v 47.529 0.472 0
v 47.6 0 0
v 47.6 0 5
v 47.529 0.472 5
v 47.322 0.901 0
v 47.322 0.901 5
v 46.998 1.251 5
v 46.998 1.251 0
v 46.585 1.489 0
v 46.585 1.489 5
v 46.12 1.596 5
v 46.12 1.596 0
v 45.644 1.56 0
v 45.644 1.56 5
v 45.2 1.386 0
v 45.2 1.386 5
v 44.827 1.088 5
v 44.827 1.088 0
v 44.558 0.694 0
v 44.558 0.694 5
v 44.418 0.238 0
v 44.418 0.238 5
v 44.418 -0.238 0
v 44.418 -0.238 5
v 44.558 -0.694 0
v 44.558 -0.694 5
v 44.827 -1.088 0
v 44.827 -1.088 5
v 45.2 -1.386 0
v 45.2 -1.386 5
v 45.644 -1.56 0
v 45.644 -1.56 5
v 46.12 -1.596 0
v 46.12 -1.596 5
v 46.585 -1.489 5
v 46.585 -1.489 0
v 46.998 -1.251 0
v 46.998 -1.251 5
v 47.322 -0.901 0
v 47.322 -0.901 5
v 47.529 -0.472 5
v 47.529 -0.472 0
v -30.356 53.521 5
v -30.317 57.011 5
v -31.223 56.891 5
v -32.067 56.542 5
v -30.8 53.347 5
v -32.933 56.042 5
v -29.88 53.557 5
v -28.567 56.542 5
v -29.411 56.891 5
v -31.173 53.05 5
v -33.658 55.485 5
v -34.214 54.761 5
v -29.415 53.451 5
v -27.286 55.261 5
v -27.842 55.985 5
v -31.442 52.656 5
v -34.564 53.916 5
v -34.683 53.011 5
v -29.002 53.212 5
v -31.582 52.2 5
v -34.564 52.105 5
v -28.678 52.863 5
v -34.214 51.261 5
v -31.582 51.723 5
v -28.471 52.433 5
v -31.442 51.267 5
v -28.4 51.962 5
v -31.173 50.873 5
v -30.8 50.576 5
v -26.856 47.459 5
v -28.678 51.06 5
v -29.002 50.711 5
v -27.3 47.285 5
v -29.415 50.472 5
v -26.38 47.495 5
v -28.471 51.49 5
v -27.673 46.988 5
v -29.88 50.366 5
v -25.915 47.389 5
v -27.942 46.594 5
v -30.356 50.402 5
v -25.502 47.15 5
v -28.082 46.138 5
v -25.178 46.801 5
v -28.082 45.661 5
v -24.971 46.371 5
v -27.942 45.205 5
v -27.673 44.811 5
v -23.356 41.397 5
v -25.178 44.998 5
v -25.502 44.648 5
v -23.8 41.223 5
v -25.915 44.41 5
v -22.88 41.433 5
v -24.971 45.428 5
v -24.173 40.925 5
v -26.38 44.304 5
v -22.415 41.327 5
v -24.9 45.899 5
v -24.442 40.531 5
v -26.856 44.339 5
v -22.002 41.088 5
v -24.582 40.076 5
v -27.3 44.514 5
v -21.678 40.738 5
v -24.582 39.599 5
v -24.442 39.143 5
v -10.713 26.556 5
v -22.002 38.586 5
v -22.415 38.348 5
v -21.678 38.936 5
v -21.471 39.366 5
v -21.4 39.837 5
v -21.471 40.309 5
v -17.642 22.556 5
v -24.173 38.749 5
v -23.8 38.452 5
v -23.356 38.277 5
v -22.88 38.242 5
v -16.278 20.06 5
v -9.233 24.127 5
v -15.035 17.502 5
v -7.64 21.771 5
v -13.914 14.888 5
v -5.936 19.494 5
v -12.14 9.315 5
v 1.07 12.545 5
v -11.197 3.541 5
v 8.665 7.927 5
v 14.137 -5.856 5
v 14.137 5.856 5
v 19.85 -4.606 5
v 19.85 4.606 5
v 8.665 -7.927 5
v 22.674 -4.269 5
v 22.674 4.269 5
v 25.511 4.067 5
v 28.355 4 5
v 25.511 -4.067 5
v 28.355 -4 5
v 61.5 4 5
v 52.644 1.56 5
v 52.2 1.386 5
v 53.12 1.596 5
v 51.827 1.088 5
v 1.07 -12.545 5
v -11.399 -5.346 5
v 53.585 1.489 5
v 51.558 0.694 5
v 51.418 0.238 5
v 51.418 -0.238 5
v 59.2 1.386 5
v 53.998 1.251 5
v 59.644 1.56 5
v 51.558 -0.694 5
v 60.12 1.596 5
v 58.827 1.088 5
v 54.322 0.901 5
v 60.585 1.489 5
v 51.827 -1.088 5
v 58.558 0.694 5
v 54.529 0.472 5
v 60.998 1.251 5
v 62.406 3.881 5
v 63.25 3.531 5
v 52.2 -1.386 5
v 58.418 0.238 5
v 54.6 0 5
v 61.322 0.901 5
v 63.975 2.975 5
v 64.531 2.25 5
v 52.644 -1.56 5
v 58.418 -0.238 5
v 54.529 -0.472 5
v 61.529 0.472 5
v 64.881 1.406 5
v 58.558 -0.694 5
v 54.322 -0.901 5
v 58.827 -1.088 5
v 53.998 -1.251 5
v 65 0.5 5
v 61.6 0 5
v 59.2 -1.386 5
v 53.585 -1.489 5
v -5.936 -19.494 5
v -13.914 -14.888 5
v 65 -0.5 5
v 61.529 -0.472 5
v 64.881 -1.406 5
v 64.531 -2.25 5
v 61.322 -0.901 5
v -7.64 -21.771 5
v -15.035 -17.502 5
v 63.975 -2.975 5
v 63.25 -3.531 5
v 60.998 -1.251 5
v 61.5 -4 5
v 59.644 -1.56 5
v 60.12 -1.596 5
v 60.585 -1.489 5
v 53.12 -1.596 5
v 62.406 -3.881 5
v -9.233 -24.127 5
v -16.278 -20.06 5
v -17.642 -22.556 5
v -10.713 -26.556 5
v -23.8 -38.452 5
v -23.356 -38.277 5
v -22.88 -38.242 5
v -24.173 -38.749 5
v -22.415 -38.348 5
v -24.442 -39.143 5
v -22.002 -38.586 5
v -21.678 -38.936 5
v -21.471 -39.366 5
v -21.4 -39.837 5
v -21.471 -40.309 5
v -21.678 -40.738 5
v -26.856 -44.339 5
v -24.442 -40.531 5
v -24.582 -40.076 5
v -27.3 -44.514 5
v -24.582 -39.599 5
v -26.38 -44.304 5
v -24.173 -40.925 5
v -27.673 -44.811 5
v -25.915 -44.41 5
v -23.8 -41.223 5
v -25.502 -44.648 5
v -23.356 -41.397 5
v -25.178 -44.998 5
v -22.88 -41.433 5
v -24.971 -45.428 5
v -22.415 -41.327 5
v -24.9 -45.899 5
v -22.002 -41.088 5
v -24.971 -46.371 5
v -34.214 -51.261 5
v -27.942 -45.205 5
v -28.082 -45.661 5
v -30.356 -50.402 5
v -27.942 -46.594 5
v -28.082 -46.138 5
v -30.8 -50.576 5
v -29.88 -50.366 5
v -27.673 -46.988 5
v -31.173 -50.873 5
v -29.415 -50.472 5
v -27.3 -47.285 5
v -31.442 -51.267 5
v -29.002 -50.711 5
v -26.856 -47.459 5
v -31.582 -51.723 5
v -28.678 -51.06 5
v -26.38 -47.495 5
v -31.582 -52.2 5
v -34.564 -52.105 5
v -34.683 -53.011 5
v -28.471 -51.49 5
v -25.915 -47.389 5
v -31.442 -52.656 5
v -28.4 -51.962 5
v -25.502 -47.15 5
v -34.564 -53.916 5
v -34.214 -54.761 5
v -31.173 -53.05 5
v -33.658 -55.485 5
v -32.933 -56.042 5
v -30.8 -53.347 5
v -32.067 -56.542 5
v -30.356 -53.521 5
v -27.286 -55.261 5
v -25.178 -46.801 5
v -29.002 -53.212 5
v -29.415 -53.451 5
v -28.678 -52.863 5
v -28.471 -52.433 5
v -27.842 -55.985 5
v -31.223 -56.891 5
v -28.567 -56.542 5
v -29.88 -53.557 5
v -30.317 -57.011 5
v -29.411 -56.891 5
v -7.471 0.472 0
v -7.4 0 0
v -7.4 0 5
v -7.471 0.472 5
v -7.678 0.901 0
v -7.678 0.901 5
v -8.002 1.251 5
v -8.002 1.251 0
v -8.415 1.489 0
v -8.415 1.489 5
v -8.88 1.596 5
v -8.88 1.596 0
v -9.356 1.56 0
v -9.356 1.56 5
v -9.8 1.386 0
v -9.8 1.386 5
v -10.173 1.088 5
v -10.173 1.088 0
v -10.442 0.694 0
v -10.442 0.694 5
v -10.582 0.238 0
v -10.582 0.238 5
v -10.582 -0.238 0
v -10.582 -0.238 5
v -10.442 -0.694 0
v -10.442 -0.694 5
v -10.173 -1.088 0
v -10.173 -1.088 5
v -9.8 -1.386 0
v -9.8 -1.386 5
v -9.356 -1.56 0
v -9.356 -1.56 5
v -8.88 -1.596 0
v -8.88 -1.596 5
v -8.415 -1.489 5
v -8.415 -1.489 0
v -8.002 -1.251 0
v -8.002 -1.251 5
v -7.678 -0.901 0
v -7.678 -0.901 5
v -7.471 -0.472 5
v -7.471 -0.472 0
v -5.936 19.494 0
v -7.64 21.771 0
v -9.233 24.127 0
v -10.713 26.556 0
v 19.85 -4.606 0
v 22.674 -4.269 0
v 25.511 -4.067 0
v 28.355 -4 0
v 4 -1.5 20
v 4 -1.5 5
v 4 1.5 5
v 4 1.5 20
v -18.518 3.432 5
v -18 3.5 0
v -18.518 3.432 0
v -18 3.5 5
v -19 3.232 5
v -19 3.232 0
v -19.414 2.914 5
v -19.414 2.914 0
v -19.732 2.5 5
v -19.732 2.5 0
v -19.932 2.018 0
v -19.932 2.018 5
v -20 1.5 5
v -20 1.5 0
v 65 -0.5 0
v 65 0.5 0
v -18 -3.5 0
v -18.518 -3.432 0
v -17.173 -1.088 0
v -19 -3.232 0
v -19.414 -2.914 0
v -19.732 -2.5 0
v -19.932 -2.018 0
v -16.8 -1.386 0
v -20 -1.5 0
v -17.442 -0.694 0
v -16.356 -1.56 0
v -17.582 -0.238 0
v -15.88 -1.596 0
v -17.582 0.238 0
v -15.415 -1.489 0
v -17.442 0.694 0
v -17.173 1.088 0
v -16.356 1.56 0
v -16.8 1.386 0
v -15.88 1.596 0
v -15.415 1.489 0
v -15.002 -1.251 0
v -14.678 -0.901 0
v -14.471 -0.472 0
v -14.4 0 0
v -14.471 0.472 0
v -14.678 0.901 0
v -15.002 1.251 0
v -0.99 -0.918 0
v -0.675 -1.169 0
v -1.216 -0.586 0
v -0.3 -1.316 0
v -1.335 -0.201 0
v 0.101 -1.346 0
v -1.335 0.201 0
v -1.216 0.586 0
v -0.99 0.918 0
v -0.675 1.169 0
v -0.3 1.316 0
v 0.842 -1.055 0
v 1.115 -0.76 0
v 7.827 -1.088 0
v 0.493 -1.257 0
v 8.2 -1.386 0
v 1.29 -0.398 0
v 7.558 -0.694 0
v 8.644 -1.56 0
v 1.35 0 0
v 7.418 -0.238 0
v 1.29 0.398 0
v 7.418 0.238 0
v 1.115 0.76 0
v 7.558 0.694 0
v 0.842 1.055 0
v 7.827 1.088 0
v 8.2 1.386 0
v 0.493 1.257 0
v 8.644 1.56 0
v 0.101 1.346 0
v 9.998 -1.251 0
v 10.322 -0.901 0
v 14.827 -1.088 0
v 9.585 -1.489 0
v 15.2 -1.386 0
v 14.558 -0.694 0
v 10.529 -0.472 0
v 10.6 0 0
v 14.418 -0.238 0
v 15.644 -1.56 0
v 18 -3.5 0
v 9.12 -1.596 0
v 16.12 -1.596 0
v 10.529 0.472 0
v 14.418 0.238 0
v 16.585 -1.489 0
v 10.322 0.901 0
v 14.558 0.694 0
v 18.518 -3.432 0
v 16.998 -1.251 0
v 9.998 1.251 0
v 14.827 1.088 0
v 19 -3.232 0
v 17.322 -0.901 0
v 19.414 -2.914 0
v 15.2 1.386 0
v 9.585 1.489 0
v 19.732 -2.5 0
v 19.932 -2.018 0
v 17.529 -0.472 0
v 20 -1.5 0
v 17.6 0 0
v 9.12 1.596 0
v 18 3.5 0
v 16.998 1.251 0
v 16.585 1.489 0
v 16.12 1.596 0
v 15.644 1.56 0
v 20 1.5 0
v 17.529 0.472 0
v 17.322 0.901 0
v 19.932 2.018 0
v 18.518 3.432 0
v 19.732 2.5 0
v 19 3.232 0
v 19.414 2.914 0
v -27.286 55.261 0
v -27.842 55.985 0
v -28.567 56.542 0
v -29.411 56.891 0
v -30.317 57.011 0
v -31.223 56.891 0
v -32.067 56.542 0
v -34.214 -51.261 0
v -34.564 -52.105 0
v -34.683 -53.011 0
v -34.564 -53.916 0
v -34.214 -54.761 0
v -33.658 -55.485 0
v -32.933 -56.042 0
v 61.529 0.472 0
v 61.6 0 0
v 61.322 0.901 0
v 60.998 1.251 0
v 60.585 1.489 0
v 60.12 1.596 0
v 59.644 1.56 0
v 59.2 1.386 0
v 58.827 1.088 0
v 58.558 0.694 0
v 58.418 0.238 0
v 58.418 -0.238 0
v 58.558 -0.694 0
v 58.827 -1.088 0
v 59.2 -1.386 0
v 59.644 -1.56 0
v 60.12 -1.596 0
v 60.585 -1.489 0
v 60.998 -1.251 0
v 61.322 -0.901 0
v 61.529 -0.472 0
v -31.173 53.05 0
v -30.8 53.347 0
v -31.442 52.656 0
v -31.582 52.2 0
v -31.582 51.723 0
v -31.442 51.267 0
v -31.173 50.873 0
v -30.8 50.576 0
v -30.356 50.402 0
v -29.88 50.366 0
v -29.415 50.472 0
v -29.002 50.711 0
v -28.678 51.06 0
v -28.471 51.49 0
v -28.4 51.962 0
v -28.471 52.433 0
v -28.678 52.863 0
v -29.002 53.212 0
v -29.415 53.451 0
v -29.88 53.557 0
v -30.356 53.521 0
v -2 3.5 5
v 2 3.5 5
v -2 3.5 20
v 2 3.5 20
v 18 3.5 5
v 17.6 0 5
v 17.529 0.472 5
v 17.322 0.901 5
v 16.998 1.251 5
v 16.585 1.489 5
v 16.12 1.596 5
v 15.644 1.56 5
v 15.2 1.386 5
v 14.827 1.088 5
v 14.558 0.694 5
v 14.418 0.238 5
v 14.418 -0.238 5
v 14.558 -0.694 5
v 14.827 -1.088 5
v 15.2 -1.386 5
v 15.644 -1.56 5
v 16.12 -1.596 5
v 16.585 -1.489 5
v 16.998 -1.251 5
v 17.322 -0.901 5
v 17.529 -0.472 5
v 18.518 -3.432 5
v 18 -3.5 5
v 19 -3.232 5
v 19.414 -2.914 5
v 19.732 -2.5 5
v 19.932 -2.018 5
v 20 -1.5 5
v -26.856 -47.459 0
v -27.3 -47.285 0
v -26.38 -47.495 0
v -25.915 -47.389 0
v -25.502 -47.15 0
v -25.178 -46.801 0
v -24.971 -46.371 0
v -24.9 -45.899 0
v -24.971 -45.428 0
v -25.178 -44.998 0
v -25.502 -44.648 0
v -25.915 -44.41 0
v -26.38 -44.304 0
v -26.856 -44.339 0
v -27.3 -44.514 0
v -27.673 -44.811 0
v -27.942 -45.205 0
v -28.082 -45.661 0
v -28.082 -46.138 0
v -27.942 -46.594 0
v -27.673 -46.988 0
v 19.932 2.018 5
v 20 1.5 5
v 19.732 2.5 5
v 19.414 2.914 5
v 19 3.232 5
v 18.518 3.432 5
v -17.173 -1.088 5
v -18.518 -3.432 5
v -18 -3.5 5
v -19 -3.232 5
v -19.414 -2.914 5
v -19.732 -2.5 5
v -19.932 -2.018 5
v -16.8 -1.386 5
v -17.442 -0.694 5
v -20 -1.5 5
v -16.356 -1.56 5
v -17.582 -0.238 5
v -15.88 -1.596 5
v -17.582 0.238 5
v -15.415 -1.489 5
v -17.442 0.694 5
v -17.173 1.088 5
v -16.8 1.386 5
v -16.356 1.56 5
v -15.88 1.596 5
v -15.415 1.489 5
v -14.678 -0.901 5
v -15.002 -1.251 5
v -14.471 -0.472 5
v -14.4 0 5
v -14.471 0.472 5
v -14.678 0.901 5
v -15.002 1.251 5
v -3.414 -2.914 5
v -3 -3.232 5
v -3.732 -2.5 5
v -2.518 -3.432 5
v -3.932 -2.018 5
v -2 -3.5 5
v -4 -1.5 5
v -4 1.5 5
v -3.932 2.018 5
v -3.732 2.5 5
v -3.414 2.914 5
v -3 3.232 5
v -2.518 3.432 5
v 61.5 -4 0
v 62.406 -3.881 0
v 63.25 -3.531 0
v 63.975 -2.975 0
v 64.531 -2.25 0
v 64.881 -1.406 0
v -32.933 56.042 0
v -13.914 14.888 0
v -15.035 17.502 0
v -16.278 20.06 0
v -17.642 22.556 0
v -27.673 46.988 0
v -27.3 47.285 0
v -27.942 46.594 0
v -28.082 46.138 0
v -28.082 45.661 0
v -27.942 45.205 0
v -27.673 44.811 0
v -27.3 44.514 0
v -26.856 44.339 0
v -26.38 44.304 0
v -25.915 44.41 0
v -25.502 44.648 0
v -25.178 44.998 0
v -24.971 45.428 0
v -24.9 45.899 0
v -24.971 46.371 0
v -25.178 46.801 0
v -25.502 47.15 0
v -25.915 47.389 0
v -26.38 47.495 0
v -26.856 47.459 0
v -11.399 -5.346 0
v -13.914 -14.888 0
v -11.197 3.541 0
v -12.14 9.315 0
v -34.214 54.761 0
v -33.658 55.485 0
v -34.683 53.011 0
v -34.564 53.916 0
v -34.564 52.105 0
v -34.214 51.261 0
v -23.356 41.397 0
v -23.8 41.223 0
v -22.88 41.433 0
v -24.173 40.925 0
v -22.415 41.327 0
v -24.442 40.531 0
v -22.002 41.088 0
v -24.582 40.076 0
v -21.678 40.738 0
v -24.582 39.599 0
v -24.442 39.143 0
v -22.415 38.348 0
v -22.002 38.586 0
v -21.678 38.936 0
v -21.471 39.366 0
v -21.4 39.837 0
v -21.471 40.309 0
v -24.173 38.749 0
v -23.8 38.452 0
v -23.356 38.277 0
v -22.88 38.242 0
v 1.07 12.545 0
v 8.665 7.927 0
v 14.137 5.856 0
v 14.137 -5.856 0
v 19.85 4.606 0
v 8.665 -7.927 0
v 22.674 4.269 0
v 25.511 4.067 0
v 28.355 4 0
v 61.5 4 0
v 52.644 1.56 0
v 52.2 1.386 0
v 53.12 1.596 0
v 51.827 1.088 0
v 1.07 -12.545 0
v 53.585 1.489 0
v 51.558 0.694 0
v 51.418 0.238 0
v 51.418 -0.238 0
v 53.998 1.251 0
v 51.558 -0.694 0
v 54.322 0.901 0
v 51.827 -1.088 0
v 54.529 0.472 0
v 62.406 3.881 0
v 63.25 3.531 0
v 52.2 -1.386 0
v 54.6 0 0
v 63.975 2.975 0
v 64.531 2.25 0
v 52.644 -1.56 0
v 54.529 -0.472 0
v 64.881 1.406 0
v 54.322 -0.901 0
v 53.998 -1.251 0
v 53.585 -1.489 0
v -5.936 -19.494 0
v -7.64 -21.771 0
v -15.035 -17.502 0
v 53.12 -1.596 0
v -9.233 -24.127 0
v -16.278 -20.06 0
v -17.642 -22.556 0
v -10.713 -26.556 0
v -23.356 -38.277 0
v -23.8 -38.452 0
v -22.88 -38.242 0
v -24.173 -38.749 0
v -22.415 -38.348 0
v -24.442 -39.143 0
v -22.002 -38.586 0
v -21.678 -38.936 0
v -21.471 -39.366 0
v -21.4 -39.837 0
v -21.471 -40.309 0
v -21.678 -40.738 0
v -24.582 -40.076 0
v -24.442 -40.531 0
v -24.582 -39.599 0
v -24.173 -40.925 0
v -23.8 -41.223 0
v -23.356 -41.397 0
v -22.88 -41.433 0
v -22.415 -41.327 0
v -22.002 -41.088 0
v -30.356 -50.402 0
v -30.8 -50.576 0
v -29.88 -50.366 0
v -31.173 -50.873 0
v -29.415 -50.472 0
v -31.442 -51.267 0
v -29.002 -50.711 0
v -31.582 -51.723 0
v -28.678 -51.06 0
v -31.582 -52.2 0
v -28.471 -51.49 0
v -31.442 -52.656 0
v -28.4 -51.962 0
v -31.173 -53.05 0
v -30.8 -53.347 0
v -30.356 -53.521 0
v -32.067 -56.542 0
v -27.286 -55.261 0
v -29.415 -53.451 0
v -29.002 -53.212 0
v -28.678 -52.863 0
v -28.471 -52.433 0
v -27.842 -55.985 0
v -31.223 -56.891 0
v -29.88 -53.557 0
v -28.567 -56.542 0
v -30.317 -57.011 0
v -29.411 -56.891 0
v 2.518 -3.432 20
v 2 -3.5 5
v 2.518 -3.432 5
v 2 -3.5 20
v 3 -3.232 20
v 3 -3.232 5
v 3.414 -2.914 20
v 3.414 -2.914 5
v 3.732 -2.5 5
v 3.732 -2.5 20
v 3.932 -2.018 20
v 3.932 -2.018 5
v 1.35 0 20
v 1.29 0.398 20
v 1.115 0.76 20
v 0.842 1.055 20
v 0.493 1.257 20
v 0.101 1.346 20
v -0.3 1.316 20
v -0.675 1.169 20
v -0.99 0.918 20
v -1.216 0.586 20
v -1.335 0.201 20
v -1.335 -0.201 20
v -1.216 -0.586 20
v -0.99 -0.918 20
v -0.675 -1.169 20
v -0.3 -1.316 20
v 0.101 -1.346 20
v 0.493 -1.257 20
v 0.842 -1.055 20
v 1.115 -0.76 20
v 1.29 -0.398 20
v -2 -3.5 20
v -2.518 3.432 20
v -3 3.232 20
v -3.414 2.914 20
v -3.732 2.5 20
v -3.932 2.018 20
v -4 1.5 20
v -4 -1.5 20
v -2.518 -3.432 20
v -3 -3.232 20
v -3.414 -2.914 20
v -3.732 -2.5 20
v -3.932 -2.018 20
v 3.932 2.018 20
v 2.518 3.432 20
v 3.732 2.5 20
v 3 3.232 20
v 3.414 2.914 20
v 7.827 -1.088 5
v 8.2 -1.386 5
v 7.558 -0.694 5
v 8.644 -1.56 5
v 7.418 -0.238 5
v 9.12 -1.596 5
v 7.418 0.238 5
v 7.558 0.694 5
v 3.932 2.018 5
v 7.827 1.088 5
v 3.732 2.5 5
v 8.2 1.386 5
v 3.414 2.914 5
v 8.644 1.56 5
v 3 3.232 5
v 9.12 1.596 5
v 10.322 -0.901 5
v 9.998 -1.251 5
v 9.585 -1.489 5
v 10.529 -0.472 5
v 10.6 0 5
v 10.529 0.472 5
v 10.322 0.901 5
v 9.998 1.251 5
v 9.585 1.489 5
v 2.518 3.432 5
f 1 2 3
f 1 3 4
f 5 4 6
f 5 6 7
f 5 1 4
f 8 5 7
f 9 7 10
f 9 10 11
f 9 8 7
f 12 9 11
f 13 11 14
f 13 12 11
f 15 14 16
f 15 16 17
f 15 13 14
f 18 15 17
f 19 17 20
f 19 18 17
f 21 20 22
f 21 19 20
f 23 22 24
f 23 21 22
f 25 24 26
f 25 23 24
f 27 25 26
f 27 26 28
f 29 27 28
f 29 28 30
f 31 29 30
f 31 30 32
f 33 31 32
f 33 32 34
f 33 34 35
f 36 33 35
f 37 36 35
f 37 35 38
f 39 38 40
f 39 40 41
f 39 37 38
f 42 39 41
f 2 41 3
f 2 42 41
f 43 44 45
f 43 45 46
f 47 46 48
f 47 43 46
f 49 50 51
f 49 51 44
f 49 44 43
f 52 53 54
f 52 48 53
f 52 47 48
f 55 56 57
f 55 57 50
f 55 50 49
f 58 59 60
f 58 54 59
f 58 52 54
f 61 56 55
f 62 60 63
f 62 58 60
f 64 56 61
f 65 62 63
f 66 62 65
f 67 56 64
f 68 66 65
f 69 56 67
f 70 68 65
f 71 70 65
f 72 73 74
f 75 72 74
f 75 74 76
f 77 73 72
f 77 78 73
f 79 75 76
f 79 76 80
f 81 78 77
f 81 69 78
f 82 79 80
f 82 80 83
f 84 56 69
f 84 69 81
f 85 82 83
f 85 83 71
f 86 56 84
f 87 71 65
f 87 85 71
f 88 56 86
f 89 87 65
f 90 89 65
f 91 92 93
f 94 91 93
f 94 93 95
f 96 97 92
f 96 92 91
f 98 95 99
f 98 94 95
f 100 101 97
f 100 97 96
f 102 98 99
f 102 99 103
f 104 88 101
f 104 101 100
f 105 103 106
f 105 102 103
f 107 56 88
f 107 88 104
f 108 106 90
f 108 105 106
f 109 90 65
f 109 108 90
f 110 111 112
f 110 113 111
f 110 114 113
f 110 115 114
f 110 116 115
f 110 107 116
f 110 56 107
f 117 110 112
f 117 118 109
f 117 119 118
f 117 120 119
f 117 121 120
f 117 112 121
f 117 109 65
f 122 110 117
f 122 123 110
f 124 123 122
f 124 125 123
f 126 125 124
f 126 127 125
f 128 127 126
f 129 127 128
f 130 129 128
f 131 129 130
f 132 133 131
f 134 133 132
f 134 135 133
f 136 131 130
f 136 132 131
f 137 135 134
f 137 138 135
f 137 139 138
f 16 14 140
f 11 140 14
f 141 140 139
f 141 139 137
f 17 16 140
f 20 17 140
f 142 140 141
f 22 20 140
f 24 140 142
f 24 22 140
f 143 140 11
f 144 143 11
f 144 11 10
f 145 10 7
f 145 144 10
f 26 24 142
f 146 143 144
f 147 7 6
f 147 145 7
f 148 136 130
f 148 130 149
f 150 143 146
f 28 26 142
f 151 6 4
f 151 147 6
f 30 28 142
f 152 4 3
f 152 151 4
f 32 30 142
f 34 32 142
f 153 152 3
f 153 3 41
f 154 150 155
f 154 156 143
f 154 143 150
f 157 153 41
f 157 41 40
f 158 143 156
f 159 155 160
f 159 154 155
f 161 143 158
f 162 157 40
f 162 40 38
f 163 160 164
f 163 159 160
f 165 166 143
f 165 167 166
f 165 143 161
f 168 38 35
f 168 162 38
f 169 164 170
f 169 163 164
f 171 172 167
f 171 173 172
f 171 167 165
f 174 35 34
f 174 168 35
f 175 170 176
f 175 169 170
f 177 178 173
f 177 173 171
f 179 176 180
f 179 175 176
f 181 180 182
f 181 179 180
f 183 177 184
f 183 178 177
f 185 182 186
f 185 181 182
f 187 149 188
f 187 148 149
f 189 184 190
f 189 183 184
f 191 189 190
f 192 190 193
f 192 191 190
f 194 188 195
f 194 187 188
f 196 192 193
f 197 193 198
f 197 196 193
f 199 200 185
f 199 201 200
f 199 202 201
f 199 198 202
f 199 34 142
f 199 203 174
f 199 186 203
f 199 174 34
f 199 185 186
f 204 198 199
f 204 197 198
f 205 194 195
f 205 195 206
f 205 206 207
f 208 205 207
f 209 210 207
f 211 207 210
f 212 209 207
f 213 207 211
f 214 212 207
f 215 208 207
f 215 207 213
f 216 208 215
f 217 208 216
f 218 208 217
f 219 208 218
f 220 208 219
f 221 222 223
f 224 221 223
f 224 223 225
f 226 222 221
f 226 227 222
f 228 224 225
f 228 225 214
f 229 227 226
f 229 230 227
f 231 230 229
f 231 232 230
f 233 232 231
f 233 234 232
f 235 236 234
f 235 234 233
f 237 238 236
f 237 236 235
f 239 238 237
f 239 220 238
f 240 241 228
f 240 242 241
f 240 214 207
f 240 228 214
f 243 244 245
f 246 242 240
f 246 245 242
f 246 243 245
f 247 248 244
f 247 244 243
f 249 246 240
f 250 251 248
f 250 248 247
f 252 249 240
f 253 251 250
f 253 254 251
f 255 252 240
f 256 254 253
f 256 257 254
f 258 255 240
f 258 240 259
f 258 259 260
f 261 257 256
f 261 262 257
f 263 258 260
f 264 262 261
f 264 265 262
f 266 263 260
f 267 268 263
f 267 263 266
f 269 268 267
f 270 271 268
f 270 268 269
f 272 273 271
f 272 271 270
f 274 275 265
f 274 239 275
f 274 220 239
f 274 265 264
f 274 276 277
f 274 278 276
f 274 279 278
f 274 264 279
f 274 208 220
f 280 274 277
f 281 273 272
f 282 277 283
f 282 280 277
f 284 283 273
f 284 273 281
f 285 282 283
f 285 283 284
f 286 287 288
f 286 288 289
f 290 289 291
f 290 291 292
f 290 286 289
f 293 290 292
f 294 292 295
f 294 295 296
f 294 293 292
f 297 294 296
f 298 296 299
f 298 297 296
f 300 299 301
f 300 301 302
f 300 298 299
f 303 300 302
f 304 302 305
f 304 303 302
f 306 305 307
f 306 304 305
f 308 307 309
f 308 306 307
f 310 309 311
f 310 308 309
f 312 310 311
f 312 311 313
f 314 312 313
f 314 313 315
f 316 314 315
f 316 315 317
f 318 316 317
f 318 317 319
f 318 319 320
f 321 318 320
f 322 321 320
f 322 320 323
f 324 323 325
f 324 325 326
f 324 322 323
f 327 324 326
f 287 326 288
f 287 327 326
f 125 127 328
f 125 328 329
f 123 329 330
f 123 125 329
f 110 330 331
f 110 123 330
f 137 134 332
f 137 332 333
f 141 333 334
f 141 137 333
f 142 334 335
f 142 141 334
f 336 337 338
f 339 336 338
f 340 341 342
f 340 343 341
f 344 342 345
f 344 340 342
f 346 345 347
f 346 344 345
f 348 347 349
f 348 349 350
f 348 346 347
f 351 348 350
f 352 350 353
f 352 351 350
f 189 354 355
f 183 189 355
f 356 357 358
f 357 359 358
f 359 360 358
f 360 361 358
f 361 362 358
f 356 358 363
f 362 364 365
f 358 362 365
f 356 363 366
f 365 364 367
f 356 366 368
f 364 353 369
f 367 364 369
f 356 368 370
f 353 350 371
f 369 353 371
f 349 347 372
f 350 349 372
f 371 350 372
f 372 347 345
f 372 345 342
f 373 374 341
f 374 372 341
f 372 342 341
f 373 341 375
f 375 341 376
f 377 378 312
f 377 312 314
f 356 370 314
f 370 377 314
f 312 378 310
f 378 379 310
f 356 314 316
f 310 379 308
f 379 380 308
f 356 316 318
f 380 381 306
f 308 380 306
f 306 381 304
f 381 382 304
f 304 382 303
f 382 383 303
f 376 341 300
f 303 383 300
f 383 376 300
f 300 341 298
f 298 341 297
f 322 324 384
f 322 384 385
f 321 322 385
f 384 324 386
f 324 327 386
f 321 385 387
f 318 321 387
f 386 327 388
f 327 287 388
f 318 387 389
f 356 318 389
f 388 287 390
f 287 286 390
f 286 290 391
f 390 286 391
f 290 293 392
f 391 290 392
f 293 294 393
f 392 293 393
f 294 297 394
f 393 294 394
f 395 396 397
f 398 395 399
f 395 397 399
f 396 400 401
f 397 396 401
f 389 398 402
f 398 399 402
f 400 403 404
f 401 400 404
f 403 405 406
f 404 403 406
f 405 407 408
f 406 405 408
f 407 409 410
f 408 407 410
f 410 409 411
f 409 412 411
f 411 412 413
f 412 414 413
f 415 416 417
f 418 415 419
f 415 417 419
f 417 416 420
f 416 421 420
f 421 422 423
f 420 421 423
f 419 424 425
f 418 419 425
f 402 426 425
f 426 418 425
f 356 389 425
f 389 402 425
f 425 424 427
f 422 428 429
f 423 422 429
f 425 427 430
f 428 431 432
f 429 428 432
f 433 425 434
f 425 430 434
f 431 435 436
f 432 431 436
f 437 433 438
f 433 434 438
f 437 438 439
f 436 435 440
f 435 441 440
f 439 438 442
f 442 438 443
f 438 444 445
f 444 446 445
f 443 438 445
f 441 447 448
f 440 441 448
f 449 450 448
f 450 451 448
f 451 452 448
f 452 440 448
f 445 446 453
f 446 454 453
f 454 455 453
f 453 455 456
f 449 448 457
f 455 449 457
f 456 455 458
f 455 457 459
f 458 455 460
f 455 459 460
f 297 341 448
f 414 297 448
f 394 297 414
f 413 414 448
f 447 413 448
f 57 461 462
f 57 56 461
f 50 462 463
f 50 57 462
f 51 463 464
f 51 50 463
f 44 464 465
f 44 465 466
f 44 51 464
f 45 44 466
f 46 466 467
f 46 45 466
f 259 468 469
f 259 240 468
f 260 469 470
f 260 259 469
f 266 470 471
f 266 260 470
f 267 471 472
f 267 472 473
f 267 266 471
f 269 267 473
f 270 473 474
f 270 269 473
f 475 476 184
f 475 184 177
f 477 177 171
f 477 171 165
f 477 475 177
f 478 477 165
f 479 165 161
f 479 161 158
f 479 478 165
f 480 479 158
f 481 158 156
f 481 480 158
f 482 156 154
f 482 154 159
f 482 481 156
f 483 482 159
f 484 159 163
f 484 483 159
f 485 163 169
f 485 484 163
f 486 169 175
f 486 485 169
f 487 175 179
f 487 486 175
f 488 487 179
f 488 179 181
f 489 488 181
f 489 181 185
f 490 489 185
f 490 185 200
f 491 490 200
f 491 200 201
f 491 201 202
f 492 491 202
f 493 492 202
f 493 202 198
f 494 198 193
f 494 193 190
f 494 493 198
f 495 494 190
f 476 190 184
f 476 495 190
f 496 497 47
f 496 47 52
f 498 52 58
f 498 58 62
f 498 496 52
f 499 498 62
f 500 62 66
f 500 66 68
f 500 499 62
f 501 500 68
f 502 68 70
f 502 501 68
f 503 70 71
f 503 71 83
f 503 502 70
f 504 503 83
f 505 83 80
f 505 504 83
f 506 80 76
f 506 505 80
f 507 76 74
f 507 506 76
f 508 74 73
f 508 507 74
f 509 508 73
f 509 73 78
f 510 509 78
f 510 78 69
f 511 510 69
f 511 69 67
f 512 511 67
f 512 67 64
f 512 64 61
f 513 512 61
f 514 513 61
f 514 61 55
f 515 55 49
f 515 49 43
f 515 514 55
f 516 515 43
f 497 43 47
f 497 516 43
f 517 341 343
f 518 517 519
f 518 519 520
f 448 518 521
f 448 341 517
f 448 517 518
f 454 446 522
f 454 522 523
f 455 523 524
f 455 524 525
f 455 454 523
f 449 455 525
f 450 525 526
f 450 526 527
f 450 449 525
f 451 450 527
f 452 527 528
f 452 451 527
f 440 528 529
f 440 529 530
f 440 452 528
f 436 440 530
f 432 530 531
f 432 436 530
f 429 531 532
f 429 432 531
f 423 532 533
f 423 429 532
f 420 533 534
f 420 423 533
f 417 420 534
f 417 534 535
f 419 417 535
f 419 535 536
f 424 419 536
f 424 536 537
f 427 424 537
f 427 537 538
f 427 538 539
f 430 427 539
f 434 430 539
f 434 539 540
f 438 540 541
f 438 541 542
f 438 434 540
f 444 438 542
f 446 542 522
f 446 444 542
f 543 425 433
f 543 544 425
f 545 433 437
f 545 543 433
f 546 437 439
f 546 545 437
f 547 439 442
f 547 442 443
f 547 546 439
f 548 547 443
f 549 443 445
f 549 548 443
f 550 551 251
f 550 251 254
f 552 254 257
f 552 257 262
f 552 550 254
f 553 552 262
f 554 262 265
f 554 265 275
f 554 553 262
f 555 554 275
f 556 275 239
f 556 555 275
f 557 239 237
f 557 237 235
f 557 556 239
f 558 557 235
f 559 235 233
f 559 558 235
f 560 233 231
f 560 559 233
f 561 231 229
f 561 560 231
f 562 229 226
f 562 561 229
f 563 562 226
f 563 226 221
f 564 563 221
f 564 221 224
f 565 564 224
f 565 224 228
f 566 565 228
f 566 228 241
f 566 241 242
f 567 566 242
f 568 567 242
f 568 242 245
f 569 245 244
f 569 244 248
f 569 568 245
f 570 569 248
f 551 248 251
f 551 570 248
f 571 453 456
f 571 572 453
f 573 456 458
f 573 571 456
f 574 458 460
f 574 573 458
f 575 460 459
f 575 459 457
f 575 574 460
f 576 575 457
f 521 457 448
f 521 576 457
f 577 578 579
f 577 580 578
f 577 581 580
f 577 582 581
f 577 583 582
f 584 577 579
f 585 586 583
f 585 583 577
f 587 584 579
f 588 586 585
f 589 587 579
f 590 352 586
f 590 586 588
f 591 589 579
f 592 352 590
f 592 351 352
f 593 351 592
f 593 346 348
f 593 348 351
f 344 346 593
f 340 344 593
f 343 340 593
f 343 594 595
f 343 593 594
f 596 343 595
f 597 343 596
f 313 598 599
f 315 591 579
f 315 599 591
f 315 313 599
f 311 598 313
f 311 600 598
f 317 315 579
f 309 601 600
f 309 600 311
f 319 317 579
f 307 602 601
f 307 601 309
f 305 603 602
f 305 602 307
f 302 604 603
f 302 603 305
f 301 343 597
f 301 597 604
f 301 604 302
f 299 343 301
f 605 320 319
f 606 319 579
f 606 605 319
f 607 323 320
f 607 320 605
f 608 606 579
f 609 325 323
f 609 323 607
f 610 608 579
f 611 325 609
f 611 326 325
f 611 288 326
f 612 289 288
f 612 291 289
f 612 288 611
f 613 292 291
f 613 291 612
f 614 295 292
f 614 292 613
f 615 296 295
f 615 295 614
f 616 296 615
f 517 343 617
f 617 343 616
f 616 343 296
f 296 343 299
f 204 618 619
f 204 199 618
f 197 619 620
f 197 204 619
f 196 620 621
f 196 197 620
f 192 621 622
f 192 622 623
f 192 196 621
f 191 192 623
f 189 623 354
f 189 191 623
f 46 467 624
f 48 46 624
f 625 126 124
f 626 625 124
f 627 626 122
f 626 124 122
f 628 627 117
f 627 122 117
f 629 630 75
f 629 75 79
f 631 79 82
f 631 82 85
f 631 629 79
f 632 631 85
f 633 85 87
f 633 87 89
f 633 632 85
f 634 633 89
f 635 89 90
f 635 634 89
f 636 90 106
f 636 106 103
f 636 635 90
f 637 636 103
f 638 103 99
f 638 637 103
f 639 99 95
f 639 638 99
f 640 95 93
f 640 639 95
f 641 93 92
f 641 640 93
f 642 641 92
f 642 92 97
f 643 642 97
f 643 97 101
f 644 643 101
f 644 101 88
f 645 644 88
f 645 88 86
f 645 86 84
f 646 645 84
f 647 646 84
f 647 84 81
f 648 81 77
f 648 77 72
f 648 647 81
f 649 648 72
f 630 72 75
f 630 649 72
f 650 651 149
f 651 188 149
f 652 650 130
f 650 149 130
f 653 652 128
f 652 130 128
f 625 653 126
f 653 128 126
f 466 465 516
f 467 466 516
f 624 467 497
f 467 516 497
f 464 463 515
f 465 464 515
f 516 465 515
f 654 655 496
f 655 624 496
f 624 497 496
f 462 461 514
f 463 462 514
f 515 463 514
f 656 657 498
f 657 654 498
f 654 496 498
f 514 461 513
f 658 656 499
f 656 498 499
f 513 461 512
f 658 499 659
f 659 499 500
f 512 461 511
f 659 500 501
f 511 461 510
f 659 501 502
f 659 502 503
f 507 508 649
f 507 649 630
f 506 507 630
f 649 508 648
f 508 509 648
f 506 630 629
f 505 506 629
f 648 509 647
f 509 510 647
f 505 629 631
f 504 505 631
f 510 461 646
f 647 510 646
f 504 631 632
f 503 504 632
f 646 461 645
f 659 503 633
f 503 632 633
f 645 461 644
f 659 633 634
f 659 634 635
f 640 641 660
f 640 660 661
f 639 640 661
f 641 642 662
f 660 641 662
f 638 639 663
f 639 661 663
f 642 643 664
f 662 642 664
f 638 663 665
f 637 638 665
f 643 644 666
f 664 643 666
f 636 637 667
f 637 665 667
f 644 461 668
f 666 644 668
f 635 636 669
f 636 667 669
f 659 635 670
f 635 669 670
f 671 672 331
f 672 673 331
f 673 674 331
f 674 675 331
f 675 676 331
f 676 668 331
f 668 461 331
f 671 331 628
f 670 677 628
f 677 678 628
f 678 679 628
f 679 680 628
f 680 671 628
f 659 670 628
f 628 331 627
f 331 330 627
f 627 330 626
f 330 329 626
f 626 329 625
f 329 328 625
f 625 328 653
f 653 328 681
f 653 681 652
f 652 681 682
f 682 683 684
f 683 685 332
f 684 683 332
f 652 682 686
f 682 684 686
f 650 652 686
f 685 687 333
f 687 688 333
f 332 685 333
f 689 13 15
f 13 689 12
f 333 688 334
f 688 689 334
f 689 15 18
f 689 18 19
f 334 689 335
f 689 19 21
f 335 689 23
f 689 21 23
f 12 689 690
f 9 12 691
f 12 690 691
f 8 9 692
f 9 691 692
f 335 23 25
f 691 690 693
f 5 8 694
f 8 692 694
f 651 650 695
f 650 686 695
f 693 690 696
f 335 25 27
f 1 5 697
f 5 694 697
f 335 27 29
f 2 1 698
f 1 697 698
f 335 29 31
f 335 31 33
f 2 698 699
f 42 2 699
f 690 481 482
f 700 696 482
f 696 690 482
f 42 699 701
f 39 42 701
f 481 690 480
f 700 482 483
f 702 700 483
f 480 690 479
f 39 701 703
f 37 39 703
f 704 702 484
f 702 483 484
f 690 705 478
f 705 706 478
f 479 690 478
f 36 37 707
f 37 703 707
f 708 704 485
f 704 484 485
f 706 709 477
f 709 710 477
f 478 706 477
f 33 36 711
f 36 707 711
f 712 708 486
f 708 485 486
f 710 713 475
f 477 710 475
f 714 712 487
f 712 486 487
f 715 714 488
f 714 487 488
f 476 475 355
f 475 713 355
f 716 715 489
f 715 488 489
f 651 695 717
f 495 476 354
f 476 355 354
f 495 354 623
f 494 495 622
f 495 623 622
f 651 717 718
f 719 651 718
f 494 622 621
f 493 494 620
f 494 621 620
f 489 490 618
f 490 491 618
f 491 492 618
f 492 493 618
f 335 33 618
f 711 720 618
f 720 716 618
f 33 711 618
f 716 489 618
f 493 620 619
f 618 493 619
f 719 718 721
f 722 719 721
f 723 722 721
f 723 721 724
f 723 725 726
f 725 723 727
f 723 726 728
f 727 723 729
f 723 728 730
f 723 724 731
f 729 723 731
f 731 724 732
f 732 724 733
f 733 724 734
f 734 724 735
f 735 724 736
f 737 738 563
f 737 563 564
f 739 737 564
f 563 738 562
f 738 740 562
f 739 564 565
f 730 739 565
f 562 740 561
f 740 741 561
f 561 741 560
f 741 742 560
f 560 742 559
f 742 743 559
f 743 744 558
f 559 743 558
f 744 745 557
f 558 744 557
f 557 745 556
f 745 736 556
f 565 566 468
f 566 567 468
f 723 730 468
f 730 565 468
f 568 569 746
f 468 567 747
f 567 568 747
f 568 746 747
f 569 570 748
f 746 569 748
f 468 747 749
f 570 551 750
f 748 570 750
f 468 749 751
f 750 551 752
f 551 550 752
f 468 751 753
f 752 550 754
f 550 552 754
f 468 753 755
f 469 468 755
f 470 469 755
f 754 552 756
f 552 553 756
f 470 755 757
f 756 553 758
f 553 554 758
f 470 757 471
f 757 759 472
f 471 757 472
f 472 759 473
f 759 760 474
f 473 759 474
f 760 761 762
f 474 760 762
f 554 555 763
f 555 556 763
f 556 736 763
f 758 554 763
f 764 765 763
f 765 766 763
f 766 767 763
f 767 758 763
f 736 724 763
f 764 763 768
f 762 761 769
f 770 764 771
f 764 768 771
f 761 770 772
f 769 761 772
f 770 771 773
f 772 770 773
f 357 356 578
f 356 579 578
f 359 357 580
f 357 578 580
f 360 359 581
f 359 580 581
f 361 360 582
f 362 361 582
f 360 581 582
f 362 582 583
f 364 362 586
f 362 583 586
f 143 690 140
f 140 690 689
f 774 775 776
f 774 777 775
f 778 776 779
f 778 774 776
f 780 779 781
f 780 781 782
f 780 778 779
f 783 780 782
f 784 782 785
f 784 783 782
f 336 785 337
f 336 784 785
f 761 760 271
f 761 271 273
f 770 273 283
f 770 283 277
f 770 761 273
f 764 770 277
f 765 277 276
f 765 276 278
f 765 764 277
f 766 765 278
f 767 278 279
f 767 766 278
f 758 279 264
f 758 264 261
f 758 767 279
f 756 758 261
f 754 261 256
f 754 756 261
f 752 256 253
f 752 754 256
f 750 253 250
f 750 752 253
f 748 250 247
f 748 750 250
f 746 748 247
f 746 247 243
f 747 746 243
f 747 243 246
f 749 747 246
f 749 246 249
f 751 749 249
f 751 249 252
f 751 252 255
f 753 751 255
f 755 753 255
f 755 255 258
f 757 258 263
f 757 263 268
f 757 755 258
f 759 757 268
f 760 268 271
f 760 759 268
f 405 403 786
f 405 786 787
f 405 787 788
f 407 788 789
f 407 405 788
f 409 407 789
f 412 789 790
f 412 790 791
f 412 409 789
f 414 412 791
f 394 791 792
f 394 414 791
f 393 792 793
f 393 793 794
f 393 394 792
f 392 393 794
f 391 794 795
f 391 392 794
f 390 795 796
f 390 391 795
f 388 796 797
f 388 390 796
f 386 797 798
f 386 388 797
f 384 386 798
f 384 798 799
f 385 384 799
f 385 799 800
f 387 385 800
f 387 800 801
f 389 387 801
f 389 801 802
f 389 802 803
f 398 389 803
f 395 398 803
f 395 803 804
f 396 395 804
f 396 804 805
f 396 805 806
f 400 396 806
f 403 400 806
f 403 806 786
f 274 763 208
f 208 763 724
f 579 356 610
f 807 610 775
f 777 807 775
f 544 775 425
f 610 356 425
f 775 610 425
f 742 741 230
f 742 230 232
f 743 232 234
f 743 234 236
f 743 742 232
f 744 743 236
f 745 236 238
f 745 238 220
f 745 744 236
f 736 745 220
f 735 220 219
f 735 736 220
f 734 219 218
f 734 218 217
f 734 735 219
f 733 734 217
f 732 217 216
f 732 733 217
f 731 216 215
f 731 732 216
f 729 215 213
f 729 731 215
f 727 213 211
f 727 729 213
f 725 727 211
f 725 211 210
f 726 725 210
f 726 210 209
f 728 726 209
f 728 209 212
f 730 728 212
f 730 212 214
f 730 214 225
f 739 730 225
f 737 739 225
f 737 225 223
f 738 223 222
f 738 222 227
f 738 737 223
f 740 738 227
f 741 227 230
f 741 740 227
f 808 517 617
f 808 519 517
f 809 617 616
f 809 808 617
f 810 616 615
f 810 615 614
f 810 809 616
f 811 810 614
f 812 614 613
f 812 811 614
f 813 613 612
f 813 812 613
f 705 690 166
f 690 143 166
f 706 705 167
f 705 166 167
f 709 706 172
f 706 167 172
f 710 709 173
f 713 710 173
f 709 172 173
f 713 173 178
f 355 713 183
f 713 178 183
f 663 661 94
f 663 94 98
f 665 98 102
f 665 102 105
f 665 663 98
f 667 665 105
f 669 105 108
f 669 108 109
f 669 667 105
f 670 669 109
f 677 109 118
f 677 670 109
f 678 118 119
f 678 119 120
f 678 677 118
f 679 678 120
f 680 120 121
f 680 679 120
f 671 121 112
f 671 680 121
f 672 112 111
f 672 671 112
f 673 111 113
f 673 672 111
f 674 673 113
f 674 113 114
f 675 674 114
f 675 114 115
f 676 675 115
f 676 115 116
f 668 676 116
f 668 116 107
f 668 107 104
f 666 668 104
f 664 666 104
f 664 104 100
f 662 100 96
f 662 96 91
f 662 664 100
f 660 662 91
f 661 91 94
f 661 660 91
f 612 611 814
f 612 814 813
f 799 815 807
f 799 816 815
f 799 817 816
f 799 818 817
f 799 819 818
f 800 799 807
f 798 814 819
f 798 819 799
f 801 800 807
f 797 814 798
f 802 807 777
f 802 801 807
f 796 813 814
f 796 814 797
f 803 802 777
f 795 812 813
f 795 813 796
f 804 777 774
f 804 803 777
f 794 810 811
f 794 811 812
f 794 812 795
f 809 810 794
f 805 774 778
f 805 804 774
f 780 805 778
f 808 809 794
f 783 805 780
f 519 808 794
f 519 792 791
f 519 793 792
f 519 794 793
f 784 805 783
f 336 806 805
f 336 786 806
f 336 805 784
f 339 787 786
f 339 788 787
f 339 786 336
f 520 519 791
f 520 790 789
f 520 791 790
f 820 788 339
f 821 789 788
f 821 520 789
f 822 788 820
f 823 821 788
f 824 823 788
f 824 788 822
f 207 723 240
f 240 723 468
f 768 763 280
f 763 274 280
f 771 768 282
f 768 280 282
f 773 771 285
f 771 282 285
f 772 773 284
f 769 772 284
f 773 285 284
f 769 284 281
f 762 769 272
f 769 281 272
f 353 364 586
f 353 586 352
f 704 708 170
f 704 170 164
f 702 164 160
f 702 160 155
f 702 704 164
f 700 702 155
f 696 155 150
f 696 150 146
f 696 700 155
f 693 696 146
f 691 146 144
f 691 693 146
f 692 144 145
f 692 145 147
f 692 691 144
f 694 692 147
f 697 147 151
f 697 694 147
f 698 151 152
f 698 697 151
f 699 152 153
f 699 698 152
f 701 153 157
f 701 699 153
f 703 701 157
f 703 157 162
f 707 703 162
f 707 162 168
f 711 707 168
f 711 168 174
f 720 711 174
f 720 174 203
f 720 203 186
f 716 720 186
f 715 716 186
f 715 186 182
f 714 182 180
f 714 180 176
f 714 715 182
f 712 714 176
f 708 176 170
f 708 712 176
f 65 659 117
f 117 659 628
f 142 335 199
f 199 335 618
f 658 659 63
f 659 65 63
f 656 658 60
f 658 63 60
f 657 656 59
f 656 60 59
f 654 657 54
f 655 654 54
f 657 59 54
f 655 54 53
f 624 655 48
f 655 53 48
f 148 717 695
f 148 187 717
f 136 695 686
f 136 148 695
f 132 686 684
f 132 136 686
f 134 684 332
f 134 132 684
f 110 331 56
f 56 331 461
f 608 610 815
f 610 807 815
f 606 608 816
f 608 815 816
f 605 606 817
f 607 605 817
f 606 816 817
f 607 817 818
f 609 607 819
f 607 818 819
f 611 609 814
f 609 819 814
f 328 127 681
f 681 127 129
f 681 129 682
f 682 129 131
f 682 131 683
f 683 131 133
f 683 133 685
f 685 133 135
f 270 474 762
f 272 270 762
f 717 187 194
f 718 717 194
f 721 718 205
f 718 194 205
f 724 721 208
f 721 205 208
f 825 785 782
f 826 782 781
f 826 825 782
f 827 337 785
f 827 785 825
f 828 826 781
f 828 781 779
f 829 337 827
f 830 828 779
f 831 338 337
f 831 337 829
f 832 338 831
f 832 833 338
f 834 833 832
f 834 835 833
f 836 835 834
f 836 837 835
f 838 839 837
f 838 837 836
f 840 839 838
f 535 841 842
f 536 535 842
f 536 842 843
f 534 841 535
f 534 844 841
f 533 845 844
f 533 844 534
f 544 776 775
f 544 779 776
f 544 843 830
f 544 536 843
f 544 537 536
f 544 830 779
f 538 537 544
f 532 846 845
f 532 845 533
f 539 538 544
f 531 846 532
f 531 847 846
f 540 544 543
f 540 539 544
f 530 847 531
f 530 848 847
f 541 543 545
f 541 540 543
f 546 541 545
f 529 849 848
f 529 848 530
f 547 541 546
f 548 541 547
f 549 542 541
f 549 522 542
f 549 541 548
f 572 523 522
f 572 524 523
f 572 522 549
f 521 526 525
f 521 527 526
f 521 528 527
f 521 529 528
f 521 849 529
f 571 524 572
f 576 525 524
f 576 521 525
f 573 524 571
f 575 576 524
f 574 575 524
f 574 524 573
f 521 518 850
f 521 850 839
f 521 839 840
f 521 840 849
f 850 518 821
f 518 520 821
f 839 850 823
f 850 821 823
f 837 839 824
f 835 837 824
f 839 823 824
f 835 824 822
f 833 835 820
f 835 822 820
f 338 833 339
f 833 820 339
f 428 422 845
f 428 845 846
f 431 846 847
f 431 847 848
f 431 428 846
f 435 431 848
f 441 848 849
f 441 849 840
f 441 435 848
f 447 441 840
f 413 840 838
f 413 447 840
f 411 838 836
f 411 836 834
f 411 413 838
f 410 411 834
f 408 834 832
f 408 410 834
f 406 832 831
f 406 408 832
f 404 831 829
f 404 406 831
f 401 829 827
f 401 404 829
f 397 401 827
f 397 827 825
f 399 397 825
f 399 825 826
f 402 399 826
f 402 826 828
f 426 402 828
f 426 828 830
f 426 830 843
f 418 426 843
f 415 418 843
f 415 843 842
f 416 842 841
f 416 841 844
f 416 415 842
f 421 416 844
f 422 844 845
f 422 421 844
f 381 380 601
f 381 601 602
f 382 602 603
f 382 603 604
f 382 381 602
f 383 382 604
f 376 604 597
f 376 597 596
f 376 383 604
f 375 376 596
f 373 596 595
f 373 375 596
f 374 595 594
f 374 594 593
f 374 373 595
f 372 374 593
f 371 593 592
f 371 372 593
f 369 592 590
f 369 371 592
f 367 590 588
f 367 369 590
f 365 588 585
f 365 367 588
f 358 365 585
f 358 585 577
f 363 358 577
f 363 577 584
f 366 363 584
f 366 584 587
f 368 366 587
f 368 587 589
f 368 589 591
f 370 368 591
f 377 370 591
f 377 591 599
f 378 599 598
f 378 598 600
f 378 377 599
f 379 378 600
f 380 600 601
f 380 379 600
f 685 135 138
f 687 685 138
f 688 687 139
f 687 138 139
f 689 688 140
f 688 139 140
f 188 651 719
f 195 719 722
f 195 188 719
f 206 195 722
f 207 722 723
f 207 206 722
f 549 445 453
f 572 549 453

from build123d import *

# Parameters (mm, degrees)
F0_W      = 40
F0_H      = 7
F0_R      = 1.6
F0_R_2    = 1.35
F1_DEPTH  = 5
F2_W      = 8
F2_H      = 7
F2_R      = 1.35
F3_DEPTH  = 20
F4_R      = 2
F5_R      = 1.6
F6_DEPTH  = 5
F7_R      = 60
F8_R      = 3.5
F10_COUNT = 3
F11_R     = 40


with BuildPart() as f1:
    # F0 (on Top) → F1 (new body)
    with BuildSketch(Plane.XY):
        Rectangle(F0_W, F0_H)
        with Locations((-16, 0)):
            Circle(F0_R, mode=Mode.SUBTRACT)
        with Locations((-9, 0)):
            Circle(F0_R, mode=Mode.SUBTRACT)
        Circle(F0_R_2, mode=Mode.SUBTRACT)
        with Locations((9, 0)):
            Circle(F0_R, mode=Mode.SUBTRACT)
        with Locations((16, 0)):
            Circle(F0_R, mode=Mode.SUBTRACT)
    extrude(amount=F1_DEPTH)

    # F2 (on Top) → F3 (join)
    with BuildSketch(Plane.XY):
        Rectangle(F2_W, F2_H)
        Circle(F2_R, mode=Mode.SUBTRACT)
    extrude(amount=F3_DEPTH)

    # F4
    f4_edges = [f1.edges().sort_by_distance(p)[0] for p in [
        (-20, -3.5, 2.5),
        (-20, 3.5, 2.5),
        (20, -3.5, 2.5),
        (-4, -3.5, 12.5),
        (4, -3.5, 12.5),
        (-4, 3.5, 12.5),
        (20, 3.5, 2.5),
        (4, 3.5, 12.5),
    ]]
    fillet(f4_edges, radius=F4_R)


with BuildPart() as f6:
    # F5 (on Top) → F6 (new body)
    with BuildSketch(Plane.XY):
        with BuildLine():
            Line((0, -4), (0, 4))
            Line((0, 4), (9.1651513899, 4))
            ThreePointArc((9.1651513899, 4), (-10, 0), (9.1651513899, -4))
            Line((9.1651513899, -4), (0, -4))
        make_face()
        with BuildLine():
            Line((9.1651513899, 4), (0, 4))
            Line((0, 4), (0, -4))
            Line((0, -4), (9.1651513899, -4))
            ThreePointArc((9.1651513899, -4), (9.7890631293, -2.0430964369), (10, 0))
            ThreePointArc((10, 0), (9.7890631293, 2.0430964369), (9.1651513899, 4))
        make_face()
        with BuildLine():
            Line((65, 4), (9.1651513899, 4))
            ThreePointArc((9.1651513899, 4), (9.7890631293, 2.0430964369), (10, 0))
            ThreePointArc((10, 0), (9.7890631293, -2.0430964369), (9.1651513899, -4))
            Line((9.1651513899, -4), (65, -4))
            Line((65, -4), (65, 4))
        make_face()
        with Locations((46, 0)):
            Circle(F5_R, mode=Mode.SUBTRACT)
        with Locations((53, 0)):
            Circle(F5_R, mode=Mode.SUBTRACT)
        with Locations((60, 0)):
            Circle(F5_R, mode=Mode.SUBTRACT)
    extrude(amount=F6_DEPTH)

    # F7
    f7_edges = [f6.edges().sort_by_distance(p)[0] for p in [
        (9.165151, -4, 2.5),
        (9.165151, 4, 2.5),
    ]]
    fillet(f7_edges, radius=F7_R)

    # F8
    f8_edges = [f6.edges().sort_by_distance(p)[0] for p in [
        (65, -4, 2.5),
        (65, 4, 2.5),
    ]]
    fillet(f8_edges, radius=F8_R)

    # F10: F6 ×3 about axis
    f10_axis = Axis((0, 0, 9.6070729196), (0, 0, 1))


with BuildPart() as f6_1:
    add(f6.part)
    for i in range(1, F10_COUNT):
        add(f6.part.rotate(f10_axis, i * 360 / F10_COUNT))

    # F11
    f11_edges = [f6_1.edges().sort_by_distance(p)[0] for p in [
        (5.033316, -8.717959, 2.5),
        (-10.066632, 0, 2.5),
        (5.033316, 8.717959, 2.5),
    ]]
    fillet(f11_edges, radius=F11_R)


solid = Compound([f1.part, f6_1.part])
